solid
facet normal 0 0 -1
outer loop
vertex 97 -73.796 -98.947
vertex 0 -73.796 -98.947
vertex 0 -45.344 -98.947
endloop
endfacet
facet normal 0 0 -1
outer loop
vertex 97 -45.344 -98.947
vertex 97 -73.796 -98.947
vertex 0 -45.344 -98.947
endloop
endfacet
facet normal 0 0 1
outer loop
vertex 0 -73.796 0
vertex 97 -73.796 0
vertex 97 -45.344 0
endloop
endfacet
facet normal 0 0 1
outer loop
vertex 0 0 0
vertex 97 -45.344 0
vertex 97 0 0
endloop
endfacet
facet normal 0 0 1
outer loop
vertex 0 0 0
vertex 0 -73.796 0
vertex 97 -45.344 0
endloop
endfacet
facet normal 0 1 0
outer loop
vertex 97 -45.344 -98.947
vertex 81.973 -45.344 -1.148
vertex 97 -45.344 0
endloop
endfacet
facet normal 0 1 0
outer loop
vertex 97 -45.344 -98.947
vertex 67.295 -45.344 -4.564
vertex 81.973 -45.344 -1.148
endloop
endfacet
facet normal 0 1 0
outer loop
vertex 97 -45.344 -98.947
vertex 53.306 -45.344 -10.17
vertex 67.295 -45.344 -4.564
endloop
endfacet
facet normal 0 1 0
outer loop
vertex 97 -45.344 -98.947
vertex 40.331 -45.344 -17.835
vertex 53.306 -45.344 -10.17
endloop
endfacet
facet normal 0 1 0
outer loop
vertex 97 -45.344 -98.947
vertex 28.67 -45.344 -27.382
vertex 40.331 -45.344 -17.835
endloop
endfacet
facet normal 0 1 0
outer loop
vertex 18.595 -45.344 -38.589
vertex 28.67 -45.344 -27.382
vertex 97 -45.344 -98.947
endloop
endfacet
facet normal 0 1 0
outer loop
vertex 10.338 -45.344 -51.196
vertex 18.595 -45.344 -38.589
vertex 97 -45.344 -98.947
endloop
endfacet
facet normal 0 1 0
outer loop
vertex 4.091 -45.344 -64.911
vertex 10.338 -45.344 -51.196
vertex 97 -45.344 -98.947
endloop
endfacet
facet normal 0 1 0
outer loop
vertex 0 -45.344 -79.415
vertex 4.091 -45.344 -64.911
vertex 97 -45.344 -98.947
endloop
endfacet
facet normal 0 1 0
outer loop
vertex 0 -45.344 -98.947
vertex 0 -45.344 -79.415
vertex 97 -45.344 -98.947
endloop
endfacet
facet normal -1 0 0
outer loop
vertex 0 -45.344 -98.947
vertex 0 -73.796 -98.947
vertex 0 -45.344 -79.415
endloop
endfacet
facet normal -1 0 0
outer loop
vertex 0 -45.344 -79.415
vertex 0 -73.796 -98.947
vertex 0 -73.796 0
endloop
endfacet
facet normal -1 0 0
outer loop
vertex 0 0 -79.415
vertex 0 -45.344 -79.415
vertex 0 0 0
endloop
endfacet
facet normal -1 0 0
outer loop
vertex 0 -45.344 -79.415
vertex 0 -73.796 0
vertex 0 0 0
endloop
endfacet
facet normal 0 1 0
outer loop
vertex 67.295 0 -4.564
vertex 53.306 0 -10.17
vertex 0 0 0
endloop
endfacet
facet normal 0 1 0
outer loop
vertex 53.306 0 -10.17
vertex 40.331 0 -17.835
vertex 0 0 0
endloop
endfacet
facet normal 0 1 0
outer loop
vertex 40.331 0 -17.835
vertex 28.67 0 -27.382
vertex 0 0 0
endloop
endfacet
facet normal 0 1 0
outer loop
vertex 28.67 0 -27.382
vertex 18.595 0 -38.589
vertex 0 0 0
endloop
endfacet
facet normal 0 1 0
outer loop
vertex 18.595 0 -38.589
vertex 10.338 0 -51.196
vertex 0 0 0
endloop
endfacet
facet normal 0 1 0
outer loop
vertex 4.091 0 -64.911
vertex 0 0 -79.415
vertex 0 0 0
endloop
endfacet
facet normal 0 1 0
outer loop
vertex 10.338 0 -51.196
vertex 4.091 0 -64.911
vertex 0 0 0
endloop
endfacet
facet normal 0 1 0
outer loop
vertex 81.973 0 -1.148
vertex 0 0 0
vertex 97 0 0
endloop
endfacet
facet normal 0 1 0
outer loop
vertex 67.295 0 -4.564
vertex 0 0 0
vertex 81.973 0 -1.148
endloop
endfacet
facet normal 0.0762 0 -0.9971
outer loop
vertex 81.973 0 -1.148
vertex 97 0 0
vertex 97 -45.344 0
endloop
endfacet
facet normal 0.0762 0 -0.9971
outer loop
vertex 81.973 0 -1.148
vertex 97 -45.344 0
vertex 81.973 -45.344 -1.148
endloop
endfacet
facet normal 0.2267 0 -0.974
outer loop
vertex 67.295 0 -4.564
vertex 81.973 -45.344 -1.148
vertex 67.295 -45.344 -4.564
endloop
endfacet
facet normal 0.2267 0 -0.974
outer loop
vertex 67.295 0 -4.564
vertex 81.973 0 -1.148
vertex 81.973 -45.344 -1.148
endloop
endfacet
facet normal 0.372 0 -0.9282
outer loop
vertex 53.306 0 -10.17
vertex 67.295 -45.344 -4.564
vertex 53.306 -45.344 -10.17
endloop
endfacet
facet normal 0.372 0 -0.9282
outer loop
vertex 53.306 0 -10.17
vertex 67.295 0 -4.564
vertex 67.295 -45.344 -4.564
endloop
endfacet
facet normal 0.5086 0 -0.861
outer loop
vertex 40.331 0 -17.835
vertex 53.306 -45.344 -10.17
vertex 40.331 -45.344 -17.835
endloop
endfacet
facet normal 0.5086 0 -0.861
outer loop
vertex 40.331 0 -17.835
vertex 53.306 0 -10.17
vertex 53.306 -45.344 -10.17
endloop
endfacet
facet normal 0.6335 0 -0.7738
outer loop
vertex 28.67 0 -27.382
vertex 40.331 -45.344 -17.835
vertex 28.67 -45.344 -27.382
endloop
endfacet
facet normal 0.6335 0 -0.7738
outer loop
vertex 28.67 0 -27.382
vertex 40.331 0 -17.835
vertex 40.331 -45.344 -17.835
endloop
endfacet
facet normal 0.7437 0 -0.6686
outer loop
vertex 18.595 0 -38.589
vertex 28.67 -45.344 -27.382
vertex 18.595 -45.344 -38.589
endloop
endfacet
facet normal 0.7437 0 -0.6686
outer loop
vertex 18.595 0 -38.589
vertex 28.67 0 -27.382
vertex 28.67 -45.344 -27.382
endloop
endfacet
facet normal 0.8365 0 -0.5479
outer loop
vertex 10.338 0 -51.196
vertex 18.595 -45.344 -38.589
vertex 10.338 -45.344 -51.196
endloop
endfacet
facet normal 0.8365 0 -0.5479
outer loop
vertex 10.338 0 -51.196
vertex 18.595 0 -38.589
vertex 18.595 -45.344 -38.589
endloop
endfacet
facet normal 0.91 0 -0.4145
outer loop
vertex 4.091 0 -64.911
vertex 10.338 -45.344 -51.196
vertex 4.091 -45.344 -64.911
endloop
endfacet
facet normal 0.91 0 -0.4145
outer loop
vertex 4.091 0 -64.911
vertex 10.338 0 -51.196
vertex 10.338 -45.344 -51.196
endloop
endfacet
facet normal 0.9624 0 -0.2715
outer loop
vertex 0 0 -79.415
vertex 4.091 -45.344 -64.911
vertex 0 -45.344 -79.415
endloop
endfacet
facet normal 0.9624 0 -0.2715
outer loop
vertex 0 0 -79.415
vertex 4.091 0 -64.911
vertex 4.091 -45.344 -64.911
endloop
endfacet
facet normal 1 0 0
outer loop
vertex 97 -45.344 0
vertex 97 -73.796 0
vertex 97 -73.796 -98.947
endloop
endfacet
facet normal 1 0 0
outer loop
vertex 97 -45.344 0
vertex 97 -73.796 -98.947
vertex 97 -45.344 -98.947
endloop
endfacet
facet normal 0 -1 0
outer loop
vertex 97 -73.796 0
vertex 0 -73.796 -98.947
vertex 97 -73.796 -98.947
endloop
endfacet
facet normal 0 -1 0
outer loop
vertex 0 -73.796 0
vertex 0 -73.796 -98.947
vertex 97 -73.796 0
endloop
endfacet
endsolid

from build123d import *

# Parameters (mm, degrees)
SKETCH1_W           = 73.796067544
SKETCH1_H           = 98.946858939
BOSS_EXTRUDE1_DEPTH = 97
SKETCH2_W           = 45.344140944
SKETCH2_H           = 98.946858939


with BuildPart() as part:
    # Sketch1 → Boss-Extrude1 (new body)
    with BuildSketch(Plane.YZ):
        with Locations((-36.898033772, -49.47342947)):
            Rectangle(SKETCH1_W, SKETCH1_H)
    extrude(amount=BOSS_EXTRUDE1_DEPTH)

    # Sketch2 → Cut-Revolve1 (revolve, cut)
    with BuildSketch(Plane.YZ.offset(97)):
        with Locations((-22.672070472, -49.47342947)):
            Rectangle(SKETCH2_W, SKETCH2_H)
    revolve(axis=Axis((97, 0, -98.946858939), (0, -1, 0)), mode=Mode.SUBTRACT)


solid = part.part
